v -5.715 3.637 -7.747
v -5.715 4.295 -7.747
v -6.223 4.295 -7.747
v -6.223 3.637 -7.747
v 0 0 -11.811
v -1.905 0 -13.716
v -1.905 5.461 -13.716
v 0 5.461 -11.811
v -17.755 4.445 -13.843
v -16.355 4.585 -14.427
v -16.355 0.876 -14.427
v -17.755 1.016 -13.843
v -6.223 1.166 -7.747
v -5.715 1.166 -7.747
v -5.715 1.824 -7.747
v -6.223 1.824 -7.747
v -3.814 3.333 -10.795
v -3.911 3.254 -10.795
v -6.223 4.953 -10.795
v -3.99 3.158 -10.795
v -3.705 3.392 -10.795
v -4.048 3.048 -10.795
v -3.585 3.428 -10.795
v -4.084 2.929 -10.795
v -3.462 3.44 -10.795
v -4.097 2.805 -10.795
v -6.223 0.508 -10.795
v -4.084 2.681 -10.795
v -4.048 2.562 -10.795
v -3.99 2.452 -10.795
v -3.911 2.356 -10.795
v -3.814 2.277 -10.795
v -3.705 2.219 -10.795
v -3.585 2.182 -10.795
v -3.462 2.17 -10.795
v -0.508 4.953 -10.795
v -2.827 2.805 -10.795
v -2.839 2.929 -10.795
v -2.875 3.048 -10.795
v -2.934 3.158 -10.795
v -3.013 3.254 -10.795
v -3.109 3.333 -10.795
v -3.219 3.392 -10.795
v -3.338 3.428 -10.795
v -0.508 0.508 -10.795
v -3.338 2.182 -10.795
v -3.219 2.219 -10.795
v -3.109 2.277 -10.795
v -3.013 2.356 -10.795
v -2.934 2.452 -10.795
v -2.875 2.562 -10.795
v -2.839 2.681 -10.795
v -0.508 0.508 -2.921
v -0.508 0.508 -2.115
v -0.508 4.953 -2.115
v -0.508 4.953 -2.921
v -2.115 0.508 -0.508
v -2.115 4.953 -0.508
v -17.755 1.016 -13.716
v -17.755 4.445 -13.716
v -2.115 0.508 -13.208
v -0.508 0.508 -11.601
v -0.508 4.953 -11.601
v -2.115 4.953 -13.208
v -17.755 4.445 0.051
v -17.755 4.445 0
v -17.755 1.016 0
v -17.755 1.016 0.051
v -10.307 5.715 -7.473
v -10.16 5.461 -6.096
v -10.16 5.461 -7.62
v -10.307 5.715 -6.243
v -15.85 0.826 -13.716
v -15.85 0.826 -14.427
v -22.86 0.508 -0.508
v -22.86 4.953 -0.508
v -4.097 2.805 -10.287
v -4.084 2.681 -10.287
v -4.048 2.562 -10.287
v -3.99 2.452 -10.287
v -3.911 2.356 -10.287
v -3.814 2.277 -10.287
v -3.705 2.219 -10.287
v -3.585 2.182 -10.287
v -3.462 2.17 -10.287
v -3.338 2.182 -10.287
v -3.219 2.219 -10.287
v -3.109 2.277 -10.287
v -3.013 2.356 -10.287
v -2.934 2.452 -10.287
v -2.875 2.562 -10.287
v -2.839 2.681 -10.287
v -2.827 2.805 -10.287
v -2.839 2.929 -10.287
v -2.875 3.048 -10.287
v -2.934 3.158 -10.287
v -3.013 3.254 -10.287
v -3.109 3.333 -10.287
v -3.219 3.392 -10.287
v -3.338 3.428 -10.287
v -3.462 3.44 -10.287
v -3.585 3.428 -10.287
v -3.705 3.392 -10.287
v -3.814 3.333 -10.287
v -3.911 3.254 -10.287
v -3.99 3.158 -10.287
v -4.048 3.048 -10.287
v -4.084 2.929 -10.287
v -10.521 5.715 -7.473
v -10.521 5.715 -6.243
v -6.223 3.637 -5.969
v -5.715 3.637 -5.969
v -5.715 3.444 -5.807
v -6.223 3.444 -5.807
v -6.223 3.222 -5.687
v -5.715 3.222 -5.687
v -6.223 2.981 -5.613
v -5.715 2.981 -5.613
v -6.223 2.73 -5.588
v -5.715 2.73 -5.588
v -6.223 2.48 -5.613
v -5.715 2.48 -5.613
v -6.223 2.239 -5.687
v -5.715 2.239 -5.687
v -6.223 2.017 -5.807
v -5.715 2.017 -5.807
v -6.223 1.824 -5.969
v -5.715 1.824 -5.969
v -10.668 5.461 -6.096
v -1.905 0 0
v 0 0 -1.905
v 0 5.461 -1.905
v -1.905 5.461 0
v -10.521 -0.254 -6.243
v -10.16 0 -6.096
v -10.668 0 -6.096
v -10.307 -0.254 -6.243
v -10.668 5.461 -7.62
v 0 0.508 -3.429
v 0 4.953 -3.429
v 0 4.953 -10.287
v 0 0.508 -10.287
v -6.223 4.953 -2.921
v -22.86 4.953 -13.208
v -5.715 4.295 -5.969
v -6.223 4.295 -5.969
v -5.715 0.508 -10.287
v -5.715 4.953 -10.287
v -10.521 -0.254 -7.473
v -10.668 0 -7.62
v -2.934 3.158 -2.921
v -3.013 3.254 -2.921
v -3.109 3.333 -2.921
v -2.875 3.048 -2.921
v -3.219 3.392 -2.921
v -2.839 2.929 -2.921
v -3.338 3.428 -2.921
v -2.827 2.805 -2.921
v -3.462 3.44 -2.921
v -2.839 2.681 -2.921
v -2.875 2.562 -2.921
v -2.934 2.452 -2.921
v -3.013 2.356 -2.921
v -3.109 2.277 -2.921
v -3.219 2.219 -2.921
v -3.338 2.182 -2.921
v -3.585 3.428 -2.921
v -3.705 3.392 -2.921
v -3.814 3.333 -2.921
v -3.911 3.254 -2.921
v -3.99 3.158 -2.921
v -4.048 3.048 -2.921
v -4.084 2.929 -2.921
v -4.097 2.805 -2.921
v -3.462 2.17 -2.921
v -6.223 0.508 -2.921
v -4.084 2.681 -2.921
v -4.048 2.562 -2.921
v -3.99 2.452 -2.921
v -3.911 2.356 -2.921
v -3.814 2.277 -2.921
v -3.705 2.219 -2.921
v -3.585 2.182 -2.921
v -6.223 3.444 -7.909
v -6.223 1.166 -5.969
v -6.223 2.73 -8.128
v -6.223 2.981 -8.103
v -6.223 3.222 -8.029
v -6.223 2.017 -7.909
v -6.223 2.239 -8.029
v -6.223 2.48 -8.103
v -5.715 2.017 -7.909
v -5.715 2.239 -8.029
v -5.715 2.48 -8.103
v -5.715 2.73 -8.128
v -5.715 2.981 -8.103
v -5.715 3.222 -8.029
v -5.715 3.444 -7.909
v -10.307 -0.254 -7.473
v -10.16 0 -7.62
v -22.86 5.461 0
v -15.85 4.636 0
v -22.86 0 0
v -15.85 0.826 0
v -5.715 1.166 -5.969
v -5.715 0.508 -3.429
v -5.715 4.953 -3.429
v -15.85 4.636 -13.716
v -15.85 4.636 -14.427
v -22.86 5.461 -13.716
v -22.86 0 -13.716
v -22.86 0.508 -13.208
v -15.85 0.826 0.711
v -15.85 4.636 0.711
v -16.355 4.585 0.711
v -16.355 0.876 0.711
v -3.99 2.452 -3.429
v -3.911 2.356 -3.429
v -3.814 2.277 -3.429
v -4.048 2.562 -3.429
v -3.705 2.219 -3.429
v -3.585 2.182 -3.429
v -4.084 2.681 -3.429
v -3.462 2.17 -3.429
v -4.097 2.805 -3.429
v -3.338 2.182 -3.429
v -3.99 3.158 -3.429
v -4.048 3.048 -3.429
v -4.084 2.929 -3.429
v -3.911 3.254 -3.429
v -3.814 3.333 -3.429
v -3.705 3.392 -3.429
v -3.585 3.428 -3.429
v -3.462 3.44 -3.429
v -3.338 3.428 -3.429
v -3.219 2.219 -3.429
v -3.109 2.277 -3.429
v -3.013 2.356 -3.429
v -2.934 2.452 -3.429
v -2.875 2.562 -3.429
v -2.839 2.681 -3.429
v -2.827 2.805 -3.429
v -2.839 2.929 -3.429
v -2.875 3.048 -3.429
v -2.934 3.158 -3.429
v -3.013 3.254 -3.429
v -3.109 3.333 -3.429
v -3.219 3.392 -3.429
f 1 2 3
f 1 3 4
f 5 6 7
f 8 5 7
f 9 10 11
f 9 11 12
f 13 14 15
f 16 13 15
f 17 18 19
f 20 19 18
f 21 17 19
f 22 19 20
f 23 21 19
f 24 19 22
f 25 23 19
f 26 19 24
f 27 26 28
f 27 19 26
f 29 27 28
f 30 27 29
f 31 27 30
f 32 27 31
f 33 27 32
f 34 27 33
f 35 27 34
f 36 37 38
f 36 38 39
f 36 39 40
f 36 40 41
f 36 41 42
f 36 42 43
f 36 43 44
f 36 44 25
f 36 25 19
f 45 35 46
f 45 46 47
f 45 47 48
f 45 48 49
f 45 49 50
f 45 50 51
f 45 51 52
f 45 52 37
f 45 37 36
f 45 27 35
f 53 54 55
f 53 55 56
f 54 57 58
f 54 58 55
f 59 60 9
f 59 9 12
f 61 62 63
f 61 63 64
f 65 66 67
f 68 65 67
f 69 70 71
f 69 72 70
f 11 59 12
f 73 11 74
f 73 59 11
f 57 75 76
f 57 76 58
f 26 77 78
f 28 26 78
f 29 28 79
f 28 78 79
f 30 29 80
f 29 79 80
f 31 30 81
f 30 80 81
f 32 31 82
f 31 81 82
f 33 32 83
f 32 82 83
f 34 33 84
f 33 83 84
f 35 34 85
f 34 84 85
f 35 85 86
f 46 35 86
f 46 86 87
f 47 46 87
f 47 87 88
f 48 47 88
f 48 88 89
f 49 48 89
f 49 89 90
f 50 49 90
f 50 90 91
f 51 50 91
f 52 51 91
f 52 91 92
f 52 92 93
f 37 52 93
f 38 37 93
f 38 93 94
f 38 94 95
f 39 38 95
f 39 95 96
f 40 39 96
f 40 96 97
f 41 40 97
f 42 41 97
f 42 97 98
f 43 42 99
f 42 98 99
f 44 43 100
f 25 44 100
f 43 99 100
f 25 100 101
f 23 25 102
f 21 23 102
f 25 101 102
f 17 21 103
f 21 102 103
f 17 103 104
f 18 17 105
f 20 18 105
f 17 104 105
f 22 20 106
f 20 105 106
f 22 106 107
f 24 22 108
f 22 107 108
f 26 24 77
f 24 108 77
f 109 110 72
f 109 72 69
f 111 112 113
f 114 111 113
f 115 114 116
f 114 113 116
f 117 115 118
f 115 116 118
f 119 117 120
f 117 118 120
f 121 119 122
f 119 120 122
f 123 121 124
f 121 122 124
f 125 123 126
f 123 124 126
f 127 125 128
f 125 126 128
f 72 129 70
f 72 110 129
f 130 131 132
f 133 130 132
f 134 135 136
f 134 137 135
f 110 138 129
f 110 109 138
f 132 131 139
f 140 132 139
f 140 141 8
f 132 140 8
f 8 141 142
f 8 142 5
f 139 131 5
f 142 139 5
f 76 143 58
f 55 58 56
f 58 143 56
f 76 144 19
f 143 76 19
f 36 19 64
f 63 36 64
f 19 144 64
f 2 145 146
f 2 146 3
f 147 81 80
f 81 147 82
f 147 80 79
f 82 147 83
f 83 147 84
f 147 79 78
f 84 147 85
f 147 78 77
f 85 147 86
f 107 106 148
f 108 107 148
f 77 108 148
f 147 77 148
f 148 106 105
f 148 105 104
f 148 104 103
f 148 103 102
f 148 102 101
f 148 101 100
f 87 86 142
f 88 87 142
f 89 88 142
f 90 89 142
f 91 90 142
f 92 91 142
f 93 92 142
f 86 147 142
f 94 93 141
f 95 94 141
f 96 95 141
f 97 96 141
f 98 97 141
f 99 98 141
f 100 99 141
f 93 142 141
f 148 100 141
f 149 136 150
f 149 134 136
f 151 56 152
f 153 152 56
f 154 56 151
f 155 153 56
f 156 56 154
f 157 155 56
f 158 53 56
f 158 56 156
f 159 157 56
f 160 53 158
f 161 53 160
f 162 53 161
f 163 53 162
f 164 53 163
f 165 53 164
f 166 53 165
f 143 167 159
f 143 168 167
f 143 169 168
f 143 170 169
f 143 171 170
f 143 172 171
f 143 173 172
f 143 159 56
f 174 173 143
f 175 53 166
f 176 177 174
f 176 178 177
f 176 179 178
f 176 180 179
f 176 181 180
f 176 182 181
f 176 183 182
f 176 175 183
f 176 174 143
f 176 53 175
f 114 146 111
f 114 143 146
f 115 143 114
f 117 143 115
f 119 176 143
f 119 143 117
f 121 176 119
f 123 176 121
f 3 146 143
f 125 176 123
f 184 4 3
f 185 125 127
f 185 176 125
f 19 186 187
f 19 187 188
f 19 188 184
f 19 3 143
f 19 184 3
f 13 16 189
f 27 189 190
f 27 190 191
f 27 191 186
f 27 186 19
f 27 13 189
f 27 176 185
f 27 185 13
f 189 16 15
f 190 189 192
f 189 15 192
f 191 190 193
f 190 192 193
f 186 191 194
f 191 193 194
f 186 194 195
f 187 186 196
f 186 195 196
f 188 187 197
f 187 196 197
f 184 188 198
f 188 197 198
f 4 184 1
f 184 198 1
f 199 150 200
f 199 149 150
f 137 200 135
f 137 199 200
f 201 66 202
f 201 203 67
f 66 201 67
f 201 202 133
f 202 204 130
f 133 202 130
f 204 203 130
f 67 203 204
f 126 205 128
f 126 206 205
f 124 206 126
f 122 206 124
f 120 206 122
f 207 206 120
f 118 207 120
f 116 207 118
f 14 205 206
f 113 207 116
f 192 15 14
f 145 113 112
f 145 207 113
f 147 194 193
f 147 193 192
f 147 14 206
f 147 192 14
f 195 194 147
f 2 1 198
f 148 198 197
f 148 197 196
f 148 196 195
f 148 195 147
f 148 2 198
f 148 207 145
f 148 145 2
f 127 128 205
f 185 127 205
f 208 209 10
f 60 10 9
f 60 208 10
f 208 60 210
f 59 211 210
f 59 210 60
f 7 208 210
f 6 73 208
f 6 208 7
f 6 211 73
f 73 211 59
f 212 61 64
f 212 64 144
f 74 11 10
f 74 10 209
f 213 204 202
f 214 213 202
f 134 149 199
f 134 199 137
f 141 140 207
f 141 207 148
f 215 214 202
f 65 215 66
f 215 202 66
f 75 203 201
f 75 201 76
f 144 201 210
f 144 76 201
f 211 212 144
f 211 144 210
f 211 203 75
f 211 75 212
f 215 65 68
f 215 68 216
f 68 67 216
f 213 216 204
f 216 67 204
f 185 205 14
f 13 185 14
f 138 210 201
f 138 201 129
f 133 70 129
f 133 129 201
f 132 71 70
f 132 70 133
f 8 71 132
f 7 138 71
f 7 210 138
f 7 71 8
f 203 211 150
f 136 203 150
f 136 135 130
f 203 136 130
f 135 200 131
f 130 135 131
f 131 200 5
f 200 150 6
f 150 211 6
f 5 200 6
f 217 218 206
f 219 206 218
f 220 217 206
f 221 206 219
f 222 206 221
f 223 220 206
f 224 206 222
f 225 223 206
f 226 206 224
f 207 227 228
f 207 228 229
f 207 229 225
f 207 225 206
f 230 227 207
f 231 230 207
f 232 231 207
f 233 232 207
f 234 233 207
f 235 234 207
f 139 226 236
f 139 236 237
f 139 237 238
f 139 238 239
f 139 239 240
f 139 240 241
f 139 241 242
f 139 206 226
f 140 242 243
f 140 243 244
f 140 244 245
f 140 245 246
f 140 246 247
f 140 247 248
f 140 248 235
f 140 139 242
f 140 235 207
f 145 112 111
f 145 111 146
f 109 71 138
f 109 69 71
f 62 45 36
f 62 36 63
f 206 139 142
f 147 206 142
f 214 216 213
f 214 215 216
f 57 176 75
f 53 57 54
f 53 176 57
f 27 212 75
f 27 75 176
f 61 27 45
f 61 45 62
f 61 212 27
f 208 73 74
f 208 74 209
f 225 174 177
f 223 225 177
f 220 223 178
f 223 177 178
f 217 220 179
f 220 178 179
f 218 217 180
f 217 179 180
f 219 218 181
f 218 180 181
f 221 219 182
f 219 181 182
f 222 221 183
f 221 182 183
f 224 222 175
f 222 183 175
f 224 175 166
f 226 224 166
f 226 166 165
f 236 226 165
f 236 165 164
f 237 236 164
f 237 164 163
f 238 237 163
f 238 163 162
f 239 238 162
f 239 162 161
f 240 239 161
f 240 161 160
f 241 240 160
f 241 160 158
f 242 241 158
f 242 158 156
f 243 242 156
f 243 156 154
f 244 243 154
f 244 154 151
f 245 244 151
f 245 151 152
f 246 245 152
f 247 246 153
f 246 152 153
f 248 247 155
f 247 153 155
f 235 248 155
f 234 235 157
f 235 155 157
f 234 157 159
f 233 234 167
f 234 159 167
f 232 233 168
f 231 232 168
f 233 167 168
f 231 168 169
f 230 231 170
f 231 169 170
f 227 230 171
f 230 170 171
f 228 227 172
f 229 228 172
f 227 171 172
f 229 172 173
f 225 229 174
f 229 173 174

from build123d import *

# Parameters (mm, degrees)
SKETCH1_W           = 22.86
SKETCH1_H           = 13.716
BOSS_EXTRUDE1_DEPTH = 5.461
CHAMFER1_SIZE       = 1.905
SKETCH2_W           = 6.858
SKETCH2_H           = 4.445
CUT_EXTRUDE1_DEPTH  = 5.715
SHELL3_START        = 0.508
SHELL3_DEPTH        = 4.445
SKETCH3_R           = 1.27
CUT_EXTRUDE2_DEPTH  = 23.625255844
SKETCH4_W           = 0.508
SKETCH4_H           = 1.524
BOSS_EXTRUDE2_DEPTH = 0.254
BOSS_EXTRUDE2_TAPER = 30
SKETCH5_W           = 0.508
SKETCH5_H           = 1.524
BOSS_EXTRUDE3_DEPTH = 0.254
BOSS_EXTRUDE3_TAPER = 30
BOSS_EXTRUDE4_DEPTH = 0.7112
CUT_EXTRUDE3_DEPTH  = 28.511138389
BOSS_EXTRUDE6_DEPTH = 0.7112
CUT_EXTRUDE4_DEPTH  = 28.876190112
CUT_EXTRUDE5_REACH  = 28.223
SKETCH11_R          = 0.635
CUT_EXTRUDE6_DEPTH  = 24.12479948


# Read off the part's stored shape, not the designer's step: Shell3
with BuildPart() as part:
    # Sketch1 → Boss-Extrude1 (new body)
    with BuildSketch(Plane(origin=(0, 0, 0), x_dir=(1, 0, 0), z_dir=(0, 1, 0))):
        with Locations((-11.43, 6.858)):
            Rectangle(SKETCH1_W, SKETCH1_H)
    extrude(amount=BOSS_EXTRUDE1_DEPTH)

    # Chamfer1
    chamfer1_edges = [part.edges().sort_by_distance(p)[0] for p in [
        (0, 2.7305, 0),
        (0, 2.7305, -13.716),
    ]]
    chamfer(chamfer1_edges, length=CHAMFER1_SIZE)

    # Sketch2 → Cut-Extrude1 (cut)
    with BuildSketch(Plane(origin=(0, 0, 0), x_dir=(0, 0, -1), z_dir=(1, 0, 0))):
        with Locations((6.858, 2.7305)):
            Rectangle(SKETCH2_W, SKETCH2_H)
    extrude(amount=-CUT_EXTRUDE1_DEPTH, mode=Mode.SUBTRACT)

    # Shell3 outline → Shell3 (cut)
    with BuildSketch(Plane(origin=(0, 0, 0), x_dir=(1, 0, 0), z_dir=(0, 1, 0)).offset(SHELL3_START)):
        Polygon((-0.508, 2.11542049), (-0.508, 2.921), (-6.223, 2.921), (-6.223, 10.795), (-0.508, 10.795), (-0.508, 11.60057951), (-2.11542049, 13.208), (-22.86, 13.208), (-22.86, 0.508), (-2.11542049, 0.508), align=None)
    extrude(amount=SHELL3_DEPTH, mode=Mode.SUBTRACT)

    # Sketch3 → Cut-Extrude2 (cut, through all)
    with BuildSketch(Plane(origin=(-5.715, 0, 0), x_dir=(0, 0, -1), z_dir=(1, 0, 0))):
        with Locations((6.858, 2.7305)):
            Circle(SKETCH3_R)
    extrude(amount=-CUT_EXTRUDE2_DEPTH, mode=Mode.SUBTRACT)

    # Sketch4 → Boss-Extrude2 (add)
    with BuildSketch(Plane(origin=(0, 5.461, 0), x_dir=(1, 0, 0), z_dir=(0, 1, 0))):
        with Locations((-10.414, 6.858)):
            Rectangle(SKETCH4_W, SKETCH4_H)
    extrude(amount=BOSS_EXTRUDE2_DEPTH, taper=BOSS_EXTRUDE2_TAPER)

    # Sketch5 → Boss-Extrude3 (add)
    with BuildSketch(Plane.XZ):
        with Locations((-10.414, -6.858)):
            Rectangle(SKETCH5_W, SKETCH5_H)
    extrude(amount=BOSS_EXTRUDE3_DEPTH, taper=BOSS_EXTRUDE3_TAPER)

    # Sketch6 → Boss-Extrude4 (add)
    with BuildSketch(Plane.XY):
        Polygon((-15.8496, 0.8255), (-15.8496, 4.6355), (-17.7546, 4.445), (-17.7546, 1.016), align=None)
    extrude(amount=BOSS_EXTRUDE4_DEPTH)

    # Sketch7 → Cut-Extrude3 (cut, through all, along a direction that is not the sketch's normal)
    with BuildSketch(Plane(origin=(-0.075194059, -0.751940594, 0), x_dir=(-0.9950371902099893, 0.09950371902099862, 0), z_dir=(-0.09950371902099861, -0.9950371902099892, 0))):
        Polygon((17.767583076, -0.0508), (16.36108177, -0.7112), (17.767583076, -0.7112), align=None)
    extrude(amount=-CUT_EXTRUDE3_DEPTH, dir=(0, -1, 0), mode=Mode.SUBTRACT)

    # Sketch9 → Boss-Extrude6 (add)
    with BuildSketch(Plane(origin=(0, 0, -13.716), x_dir=(-1, 0, 0), z_dir=(0, 0, -1))):
        Polygon((17.7546, 1.016), (15.8496, 0.8255), (15.8496, 4.6355), (17.7546, 4.445), align=None)
    extrude(amount=BOSS_EXTRUDE6_DEPTH)

    # Sketch10 → Cut-Extrude4 (cut, through all, along a direction that is not the sketch's normal)
    with BuildSketch(Plane(origin=(-0.075194059, -0.751940594, 0), x_dir=(0.9950371902099892, -0.09950371902099901, 0), z_dir=(-0.09950371902099903, -0.9950371902099893, 0))):
        Polygon((-16.36108177, -14.4272), (-17.767583076, -13.843), (-17.767583076, -14.4272), align=None)
    extrude(amount=-CUT_EXTRUDE4_DEPTH, dir=(0, -1, 0), mode=Mode.SUBTRACT)

    # Cut-Extrude5: up to this face of the body (flat: up to its plane)
    cut_extrude5_end = Plane(part.part.faces().sort_by_distance((-12.487710245, 2.7305, -13.208))[0])
    # Sketch11 → Cut-Extrude5 (cut, up to the picked face)
    with BuildSketch(Plane.XY.offset(-2.921), mode=Mode.PRIVATE) as cut_extrude5_sk1:
        with Locations(Location((-3.461534283, 2.805193331, 0), (0, 0, 180))):
            Circle(SKETCH11_R)
    cut_extrude5_tool1 = split(extrude(cut_extrude5_sk1.sketch, amount=-CUT_EXTRUDE5_REACH, mode=Mode.PRIVATE), bisect_by=cut_extrude5_end, keep=Keep.BOTH, mode=Mode.PRIVATE)
    add(cut_extrude5_tool1.solids().sort_by(Axis((-3.461534, 2.805193, -2.921), (0, 0, -1)))[0], mode=Mode.SUBTRACT)

    # Sketch12 → Cut-Extrude6 (cut, through all)
    with BuildSketch(Plane(origin=(-5.715, 0, 0), x_dir=(0, 0, -1), z_dir=(1, 0, 0))):
        with BuildLine():
            Line((5.969, 3.63746141), (5.969, 4.295230705))
            Line((5.969, 4.295230705), (7.747, 4.295230705))
            Line((7.747, 4.295230705), (7.747, 3.63746141))
            ThreePointArc((7.747, 3.63746141), (6.858, 4.0005), (5.969, 3.63746141))
        make_face()
        with BuildLine():
            Line((5.969, 1.82353859), (5.969, 1.165769295))
            Line((5.969, 1.165769295), (7.747, 1.165769295))
            Line((7.747, 1.165769295), (7.747, 1.82353859))
            ThreePointArc((7.747, 1.82353859), (6.858, 1.4605), (5.969, 1.82353859))
        make_face()
    extrude(amount=-CUT_EXTRUDE6_DEPTH, mode=Mode.SUBTRACT)


solid = part.part
